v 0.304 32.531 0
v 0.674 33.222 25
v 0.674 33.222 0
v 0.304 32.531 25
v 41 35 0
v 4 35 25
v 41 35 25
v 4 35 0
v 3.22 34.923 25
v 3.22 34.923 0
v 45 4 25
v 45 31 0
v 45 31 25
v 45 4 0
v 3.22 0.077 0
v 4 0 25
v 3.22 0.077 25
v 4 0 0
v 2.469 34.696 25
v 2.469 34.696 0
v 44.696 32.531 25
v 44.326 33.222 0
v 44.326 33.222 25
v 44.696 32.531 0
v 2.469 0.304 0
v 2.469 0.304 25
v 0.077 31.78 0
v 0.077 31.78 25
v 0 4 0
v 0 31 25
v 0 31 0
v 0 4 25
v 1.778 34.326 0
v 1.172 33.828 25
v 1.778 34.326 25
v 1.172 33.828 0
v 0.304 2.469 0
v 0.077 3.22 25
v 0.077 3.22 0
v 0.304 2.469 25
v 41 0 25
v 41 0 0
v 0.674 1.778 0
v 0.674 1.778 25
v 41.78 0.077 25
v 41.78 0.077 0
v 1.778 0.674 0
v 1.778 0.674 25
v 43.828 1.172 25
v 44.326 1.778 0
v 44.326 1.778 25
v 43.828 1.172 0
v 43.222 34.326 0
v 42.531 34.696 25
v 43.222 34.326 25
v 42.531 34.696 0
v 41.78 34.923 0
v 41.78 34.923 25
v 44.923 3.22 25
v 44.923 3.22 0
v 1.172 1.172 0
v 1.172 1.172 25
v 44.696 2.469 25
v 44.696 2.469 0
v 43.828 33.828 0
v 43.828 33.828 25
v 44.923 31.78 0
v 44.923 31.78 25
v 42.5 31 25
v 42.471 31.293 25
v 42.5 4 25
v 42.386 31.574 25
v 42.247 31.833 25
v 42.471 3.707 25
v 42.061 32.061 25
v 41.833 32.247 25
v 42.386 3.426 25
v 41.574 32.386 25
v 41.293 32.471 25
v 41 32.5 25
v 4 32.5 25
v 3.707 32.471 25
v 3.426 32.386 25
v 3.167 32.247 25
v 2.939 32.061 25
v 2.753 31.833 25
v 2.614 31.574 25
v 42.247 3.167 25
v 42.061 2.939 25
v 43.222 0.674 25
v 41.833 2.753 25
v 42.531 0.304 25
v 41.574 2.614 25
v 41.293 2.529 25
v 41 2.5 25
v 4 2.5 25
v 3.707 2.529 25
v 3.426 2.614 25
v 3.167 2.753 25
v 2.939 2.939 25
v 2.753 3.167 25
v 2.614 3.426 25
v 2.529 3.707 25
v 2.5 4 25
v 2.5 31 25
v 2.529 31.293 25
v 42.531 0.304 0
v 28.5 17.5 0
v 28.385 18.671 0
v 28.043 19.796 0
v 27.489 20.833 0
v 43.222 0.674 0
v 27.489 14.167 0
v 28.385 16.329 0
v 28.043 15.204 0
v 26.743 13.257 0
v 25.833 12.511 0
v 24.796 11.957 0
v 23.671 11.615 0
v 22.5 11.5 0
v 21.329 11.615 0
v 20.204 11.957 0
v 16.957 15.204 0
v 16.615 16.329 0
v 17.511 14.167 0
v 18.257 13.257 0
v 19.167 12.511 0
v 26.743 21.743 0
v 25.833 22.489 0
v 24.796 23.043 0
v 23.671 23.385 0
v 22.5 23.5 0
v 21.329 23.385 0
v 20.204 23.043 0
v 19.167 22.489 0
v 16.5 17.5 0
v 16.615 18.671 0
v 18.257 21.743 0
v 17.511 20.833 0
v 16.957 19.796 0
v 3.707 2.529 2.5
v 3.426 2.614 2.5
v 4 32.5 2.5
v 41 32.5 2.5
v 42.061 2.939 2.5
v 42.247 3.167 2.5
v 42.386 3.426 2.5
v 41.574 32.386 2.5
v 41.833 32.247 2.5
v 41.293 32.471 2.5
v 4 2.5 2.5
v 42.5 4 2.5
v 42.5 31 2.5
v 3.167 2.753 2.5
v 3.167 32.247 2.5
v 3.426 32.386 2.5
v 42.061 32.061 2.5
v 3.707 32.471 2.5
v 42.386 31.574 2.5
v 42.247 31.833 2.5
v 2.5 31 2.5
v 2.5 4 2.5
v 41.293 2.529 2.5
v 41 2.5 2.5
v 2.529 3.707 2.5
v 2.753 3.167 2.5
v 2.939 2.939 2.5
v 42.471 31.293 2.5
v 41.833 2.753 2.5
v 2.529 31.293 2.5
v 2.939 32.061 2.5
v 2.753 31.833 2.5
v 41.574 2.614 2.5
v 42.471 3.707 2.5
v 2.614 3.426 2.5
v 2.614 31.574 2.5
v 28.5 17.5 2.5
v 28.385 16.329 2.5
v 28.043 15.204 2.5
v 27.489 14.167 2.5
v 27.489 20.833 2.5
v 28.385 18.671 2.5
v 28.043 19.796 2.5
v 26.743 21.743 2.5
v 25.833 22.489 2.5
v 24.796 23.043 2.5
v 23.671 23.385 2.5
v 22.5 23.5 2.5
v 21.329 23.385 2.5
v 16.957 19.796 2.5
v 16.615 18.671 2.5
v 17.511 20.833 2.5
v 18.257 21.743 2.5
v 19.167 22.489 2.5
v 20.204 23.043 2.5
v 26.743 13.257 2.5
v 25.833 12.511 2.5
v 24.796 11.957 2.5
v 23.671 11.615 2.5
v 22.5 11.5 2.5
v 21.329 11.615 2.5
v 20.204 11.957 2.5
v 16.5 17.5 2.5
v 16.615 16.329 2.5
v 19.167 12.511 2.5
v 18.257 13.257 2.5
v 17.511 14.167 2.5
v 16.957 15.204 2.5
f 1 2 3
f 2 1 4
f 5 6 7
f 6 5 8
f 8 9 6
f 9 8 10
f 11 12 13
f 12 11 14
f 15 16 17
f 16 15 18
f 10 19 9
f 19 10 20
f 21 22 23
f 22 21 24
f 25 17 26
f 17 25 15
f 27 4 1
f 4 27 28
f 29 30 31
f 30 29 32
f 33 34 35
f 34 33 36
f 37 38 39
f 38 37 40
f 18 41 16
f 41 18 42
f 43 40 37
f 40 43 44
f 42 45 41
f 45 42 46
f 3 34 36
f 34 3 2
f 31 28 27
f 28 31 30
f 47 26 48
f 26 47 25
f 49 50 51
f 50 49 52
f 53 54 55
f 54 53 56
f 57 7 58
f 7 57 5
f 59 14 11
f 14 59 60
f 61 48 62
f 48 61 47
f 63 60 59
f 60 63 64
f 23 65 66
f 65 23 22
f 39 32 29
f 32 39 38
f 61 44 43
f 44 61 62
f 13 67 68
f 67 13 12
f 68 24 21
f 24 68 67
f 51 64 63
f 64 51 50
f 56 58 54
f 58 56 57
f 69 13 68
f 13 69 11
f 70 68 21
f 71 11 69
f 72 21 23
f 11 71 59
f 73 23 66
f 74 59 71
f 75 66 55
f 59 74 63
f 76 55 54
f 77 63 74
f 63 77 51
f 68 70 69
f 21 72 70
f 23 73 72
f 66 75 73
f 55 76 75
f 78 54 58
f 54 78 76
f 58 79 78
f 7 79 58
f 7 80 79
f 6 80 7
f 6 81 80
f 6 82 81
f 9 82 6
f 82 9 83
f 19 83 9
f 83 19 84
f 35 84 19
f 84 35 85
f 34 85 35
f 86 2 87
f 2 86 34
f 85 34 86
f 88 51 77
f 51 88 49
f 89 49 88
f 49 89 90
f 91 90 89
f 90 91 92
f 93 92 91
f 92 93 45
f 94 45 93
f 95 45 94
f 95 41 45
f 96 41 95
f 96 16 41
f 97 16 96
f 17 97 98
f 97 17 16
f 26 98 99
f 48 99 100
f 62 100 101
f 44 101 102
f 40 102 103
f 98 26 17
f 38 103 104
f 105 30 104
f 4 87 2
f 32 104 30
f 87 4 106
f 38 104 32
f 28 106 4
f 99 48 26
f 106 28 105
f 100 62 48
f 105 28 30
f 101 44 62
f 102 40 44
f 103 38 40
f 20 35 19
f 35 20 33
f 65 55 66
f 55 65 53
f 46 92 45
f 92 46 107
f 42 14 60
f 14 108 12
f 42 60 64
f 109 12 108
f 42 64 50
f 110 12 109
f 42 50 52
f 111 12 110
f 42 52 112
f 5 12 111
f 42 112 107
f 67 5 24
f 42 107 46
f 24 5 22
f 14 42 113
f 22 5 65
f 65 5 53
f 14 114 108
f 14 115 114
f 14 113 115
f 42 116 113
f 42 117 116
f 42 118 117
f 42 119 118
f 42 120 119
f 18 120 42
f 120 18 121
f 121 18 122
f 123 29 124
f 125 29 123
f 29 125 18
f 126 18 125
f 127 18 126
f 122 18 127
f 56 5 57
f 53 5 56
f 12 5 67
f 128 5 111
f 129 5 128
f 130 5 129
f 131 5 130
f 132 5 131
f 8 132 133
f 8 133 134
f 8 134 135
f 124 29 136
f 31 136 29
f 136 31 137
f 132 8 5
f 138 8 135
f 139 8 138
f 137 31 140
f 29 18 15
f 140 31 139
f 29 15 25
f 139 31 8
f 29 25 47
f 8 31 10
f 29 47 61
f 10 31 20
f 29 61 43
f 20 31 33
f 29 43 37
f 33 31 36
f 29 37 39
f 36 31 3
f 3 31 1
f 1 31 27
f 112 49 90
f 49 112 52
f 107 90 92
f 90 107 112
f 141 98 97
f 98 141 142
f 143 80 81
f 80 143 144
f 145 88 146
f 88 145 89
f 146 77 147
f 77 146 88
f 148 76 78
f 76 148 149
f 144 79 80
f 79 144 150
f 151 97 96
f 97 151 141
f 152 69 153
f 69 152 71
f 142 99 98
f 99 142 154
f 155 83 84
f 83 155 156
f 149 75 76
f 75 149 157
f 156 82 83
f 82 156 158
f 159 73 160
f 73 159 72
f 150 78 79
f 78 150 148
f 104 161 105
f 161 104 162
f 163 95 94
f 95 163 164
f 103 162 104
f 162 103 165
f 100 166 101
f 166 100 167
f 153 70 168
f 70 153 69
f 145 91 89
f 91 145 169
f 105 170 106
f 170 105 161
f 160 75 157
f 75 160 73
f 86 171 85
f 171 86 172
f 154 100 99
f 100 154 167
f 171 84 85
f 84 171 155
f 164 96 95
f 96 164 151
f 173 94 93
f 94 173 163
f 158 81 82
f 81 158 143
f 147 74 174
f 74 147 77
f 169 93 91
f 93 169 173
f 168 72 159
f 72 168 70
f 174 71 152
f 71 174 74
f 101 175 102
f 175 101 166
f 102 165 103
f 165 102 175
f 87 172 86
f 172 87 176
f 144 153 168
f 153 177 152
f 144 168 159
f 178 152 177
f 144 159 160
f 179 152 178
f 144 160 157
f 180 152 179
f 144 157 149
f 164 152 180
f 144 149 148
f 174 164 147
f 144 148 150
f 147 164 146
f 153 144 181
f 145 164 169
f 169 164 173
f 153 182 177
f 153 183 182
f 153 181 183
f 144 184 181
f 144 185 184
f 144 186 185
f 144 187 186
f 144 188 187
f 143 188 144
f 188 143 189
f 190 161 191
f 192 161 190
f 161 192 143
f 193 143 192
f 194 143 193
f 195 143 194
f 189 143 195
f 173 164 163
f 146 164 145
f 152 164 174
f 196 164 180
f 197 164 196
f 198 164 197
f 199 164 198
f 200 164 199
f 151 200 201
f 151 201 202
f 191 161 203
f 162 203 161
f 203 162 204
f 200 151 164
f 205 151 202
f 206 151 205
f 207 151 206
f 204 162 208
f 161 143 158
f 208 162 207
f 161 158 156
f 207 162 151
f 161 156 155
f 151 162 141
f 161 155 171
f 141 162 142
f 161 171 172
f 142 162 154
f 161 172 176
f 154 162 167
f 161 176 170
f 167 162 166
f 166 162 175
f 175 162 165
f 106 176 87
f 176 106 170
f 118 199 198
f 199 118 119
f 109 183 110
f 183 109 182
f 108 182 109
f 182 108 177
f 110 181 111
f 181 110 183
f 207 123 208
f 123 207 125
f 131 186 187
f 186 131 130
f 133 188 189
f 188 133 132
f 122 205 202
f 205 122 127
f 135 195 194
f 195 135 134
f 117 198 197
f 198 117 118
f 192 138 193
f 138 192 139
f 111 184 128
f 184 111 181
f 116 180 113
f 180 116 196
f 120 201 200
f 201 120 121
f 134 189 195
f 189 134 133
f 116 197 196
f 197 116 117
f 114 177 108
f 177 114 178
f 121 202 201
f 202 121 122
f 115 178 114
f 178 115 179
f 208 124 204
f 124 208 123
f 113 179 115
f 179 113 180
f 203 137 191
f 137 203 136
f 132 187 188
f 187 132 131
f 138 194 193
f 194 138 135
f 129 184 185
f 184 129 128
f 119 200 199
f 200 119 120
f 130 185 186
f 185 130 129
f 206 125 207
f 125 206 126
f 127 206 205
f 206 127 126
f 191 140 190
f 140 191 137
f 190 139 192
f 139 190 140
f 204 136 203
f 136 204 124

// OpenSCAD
/* [Parameters] */
// Width of the box in mm
width = 45; // [20:100]

// Depth of the box in mm
depth = 35; // [20:80]

// Height of the box in mm
height = 25; // [10:60]

// Wall thickness in mm
wall_thickness = 2.5; // [1:0.5:5]

// Corner rounding radius
corner_radius = 4; // [0:10]

// Add center hole
center_hole = true;

// Level of detail
$fn = 32;

module rounded_cube(size, r) {
  x = size[0];
  y = size[1];
  z = size[2];
  hull() {
    translate([r, r, 0]) cylinder(r=r, h=z);
    translate([x - r, r, 0]) cylinder(r=r, h=z);
    translate([r, y - r, 0]) cylinder(r=r, h=z);
    translate([x - r, y - r, 0]) cylinder(r=r, h=z);
  }
}

difference() {
  // Outer enclosure
  rounded_cube([width, depth, height], corner_radius);

  // Inner hollow cavity
  translate([wall_thickness, wall_thickness, wall_thickness])
    rounded_cube(
      [width - 2 * wall_thickness, depth - 2 * wall_thickness, height],
      max(1, corner_radius - wall_thickness)
    );

  // Center cable / ventilation port
  if (center_hole) {
    translate([width / 2, depth / 2, -1])
      cylinder(r=6, h=wall_thickness + 2);
  }
}
